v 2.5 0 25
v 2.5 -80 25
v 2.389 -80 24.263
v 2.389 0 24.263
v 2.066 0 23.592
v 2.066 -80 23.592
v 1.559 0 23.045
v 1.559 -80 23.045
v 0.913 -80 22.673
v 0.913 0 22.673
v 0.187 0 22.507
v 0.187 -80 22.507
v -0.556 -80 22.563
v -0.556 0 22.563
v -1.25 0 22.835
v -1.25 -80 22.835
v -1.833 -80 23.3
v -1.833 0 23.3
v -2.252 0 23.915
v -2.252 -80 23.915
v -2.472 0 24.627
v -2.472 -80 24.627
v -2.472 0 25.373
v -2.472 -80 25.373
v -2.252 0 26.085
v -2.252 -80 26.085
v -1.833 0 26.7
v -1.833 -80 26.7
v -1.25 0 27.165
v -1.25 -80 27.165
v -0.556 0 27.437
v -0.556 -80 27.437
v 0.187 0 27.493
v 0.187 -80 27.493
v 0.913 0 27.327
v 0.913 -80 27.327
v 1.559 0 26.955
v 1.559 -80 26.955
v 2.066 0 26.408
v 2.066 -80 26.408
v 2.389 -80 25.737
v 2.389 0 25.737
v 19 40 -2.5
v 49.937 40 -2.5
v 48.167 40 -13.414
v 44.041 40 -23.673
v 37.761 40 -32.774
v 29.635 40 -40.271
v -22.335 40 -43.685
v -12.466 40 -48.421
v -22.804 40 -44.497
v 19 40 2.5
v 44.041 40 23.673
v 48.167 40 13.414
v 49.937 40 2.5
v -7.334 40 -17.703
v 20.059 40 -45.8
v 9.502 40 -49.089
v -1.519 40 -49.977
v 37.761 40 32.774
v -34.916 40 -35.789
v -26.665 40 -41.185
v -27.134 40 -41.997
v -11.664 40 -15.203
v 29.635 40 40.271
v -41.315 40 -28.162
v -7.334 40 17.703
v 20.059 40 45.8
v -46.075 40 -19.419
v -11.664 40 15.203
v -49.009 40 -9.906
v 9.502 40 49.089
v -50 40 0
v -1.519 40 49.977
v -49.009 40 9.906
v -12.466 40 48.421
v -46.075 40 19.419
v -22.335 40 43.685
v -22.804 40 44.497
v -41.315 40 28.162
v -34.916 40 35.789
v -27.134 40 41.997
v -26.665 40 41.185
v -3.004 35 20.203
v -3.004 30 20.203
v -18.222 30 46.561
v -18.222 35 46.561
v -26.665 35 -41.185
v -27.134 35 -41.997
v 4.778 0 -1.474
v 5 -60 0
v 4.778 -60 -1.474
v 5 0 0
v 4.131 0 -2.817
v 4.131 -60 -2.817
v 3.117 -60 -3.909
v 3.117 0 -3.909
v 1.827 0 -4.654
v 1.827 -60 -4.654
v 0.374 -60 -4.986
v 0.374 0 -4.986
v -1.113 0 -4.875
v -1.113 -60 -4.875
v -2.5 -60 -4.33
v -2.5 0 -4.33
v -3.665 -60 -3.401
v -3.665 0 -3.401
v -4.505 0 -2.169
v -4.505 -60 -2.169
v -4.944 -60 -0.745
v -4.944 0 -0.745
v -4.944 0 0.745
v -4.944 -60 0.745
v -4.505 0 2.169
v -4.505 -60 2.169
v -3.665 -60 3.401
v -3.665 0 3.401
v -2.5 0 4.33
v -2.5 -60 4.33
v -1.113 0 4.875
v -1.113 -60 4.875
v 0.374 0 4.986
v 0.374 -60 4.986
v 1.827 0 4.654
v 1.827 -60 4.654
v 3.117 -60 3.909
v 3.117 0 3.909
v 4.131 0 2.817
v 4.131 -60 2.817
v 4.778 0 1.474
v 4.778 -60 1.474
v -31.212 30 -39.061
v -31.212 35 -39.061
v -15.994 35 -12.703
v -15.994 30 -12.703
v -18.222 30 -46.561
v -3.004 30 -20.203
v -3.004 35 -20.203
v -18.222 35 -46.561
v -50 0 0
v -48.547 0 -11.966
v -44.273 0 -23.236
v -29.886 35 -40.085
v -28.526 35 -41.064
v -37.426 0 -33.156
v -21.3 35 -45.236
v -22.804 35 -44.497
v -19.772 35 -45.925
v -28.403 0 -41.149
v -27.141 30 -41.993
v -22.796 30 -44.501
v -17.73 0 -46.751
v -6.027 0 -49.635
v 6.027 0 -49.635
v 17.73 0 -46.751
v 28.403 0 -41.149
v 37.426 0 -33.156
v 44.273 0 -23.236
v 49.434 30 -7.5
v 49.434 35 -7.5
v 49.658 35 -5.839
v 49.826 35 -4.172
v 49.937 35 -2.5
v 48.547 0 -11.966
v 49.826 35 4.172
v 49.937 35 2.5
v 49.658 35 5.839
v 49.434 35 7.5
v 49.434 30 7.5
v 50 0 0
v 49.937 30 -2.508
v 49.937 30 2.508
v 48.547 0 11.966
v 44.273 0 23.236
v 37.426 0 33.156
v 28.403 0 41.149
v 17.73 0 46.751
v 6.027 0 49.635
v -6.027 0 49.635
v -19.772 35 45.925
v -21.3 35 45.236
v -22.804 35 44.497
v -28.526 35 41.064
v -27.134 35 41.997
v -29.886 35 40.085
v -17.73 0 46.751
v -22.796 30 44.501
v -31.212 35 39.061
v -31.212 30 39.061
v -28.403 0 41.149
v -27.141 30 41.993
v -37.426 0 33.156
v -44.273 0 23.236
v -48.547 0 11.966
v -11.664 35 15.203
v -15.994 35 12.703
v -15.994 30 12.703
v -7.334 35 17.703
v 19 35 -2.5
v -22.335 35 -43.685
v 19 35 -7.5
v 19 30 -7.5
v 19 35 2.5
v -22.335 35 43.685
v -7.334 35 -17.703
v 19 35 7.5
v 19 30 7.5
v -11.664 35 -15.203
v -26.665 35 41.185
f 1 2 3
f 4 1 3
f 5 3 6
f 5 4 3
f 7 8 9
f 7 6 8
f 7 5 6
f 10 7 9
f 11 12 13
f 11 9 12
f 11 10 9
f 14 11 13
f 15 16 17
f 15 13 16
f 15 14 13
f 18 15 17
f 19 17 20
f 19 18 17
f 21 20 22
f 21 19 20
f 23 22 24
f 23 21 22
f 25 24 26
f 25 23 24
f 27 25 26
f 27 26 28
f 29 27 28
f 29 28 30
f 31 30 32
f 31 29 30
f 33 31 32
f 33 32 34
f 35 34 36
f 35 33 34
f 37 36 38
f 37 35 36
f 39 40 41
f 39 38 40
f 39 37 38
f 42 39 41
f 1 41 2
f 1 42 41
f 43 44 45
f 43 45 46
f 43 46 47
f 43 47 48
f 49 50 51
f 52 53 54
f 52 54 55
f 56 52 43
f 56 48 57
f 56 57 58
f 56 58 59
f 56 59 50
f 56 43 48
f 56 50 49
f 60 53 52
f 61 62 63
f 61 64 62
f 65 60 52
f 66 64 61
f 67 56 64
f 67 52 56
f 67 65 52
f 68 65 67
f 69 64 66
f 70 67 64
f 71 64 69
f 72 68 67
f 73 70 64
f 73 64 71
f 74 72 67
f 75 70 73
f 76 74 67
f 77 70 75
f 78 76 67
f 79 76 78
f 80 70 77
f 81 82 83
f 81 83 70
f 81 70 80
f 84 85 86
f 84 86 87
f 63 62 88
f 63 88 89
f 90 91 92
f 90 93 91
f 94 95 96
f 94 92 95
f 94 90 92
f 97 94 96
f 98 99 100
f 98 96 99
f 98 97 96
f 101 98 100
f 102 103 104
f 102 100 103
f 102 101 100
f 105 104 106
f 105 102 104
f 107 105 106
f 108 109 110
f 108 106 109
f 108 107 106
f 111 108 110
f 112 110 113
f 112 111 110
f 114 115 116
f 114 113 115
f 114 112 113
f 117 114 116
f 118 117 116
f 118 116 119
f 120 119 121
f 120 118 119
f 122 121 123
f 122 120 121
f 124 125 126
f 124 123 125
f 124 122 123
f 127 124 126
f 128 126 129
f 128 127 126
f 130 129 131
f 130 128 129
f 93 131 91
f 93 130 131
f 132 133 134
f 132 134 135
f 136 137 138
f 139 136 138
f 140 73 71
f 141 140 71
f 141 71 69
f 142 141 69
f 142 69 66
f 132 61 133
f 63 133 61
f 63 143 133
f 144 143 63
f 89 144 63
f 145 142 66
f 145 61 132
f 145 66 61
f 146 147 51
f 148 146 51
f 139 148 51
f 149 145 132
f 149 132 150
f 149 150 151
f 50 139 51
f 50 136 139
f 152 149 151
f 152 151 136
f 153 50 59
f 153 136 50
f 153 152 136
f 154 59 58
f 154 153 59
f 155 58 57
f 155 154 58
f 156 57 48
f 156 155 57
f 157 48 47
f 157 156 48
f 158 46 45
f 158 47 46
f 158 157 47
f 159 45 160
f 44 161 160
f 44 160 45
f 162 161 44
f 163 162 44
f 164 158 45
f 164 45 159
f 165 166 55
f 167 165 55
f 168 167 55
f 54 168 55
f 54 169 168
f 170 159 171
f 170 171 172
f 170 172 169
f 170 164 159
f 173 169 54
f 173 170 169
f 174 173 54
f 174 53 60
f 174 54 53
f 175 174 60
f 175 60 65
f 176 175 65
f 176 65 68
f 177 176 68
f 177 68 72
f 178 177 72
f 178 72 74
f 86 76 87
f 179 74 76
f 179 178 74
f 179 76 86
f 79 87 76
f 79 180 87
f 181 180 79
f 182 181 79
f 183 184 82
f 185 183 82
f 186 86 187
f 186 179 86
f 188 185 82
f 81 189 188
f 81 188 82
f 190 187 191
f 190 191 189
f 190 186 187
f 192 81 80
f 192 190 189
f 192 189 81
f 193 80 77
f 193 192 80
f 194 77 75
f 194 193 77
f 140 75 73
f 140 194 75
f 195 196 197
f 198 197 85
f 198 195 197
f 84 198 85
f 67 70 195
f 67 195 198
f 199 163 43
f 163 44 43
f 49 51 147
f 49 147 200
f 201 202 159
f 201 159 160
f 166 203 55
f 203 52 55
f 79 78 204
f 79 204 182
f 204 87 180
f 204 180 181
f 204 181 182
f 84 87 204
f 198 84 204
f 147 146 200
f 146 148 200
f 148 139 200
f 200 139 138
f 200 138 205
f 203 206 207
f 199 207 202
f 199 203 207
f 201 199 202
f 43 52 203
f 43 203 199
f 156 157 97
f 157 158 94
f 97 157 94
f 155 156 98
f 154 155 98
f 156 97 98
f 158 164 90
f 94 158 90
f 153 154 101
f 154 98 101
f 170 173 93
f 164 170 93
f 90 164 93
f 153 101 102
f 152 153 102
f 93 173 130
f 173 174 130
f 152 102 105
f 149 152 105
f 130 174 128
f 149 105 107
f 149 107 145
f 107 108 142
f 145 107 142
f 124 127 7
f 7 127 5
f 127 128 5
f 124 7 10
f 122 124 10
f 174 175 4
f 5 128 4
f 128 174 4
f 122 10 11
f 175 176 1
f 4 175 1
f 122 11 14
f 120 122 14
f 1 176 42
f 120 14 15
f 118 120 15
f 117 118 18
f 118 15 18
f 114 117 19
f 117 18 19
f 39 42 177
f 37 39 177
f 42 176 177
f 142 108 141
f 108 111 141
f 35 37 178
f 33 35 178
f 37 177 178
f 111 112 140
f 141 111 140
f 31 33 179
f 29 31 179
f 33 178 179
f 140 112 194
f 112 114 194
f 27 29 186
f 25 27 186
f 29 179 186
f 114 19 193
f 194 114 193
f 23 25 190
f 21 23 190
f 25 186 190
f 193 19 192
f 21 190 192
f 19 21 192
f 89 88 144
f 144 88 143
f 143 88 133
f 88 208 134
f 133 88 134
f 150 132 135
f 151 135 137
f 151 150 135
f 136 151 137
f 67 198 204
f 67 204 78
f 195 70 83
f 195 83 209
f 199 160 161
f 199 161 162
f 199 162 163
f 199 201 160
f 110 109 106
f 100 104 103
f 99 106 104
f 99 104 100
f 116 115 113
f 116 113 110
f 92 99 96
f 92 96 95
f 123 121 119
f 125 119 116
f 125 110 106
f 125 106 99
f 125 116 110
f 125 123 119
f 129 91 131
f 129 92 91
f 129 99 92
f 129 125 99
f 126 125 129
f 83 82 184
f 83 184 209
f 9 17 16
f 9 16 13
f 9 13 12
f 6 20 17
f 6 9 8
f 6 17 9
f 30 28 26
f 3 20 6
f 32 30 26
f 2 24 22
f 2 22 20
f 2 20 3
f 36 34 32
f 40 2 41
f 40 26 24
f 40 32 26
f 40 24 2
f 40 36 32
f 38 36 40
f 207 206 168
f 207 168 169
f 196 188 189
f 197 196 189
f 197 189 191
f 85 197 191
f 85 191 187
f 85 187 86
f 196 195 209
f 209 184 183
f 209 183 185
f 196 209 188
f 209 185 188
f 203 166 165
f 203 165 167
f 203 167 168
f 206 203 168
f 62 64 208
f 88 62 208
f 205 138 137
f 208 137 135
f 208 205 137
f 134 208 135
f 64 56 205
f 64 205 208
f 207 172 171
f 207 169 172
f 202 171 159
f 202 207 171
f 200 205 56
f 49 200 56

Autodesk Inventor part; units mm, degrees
ref_plane "YZ Plane" through (0, 0, 0) normal (1, 0, 0) x (0, 1, 0)
ref_plane "XZ Plane" through (0, 0, 0) normal (0, 1, 0) x (-1, 0, 0)
ref_plane "XY Plane" through (0, 0, 0) normal (0, 0, 1) x (1, 0, 0)
sketch "Sketch1" plane through (0, 0, 0) normal (0, 1, 0) x (-1, 0, 0)
  circle A0 centre (0, 0) radius 50
  dimension "d0" = 100
extrude "Extrusion1" add sketch "Sketch1" along normal blind 40
sketch "Sketch6" plane through (0, 0, 0) normal (0, -1, 0) x (1, 0, 0)
  circle A0 centre (0, 0) radius 5
  dimension "d36" = 10
extrude "Extrusion6" add sketch "Sketch6" along normal blind 60
thread "Thread1" size "M10x1.5" class "6g" standard "ANSI Metric M Profile" full length
sketch "Sketch7" plane through (0, 40, 0) normal (0, 1, 0) x (1, 0, 0)
  line L0 (0, 0) -> (0, 50)
  circle A0 centre (0, 0) radius 5 projected
  line L1 (-27.5, -47.6314) -> (-29.6651, -46.3814)
  line L2 (-29.6651, -46.3814) -> (-26.6651, -41.1852)
  line L3 (-22.3349, -43.6852) -> (-25.3349, -48.8814)
  line L4 (-25.3349, -48.8814) -> (-27.5, -47.6314)
  line L5 (-22.3349, -43.6852) -> (-26.6651, -41.1852)
  line L6 (-27.5, 47.6314) -> (-25.3349, 48.8814)
  line L7 (-25.3349, 48.8814) -> (-22.3349, 43.6852)
  line L8 (-22.3349, 43.6852) -> (-26.6651, 41.1852)
  line L9 (-26.6651, 41.1852) -> (-29.6651, 46.3814)
  line L10 (-29.6651, 46.3814) -> (-27.5, 47.6314)
  line L11 (55, 0) -> (55, 2.5)
  line L12 (55, 2.5) -> (49, 2.5)
  line L13 (49, 2.5) -> (49, -2.5)
  line L14 (49, -2.5) -> (55, -2.5)
  line L15 (55, -2.5) -> (55, 0)
  dimension "d52" = 5
  dimension "d55" = 6
  dimension "d58" = 2.5
  dimension "d60" = 5
extrude "Extrusion7" cut sketch "Sketch7" against normal blind 5 contours L1 L2 L5 L3 L4 | L6 L7 L8 L9 L10 | L15 L14 L13 L12 L11
sketch "Sketch8" plane through (-22.3349, 35, -43.6852) normal (-0.5, 0, -0.866) x (-0.866, 0, 0.5)
  line L0 (0, 5) -> (5, 5)
  line L1 (5, 5) -> (5, 0)
  line L2 (5, 5) -> (5, 0) projected
  line L3 (5, 0) -> (10, 0)
  line L4 (10, 0) -> (10, -5)
  line L5 (10, -5) -> (-5, -5)
  line L6 (-5, -5) -> (-5, 0)
  line L7 (-5, 0) -> (0, 0)
  line L8 (0, 0) -> (0, 5)
  line L9 (0, 5) -> (0, 0) projected
  point P0 (2.5, -35)
  dimension "d63" = 5
  dimension "d64" = 5
  dimension "d65" = 15
extrude "Extrusion8" cut sketch "Sketch8" along normal mid plane 60
sketch "Sketch9" plane through (49, 40, 2.5) normal (1, 0, 0) x (0, 0, -1)
  line L0 (5, 0) -> (0, 0)
  line L1 (0, 0) -> (5, 0) projected
  line L2 (0, 0) -> (0, -5)
  line L3 (0, -5) -> (0, 0) projected
  line L4 (0, -5) -> (-5, -5)
  line L5 (-5, -5) -> (-5, -10)
  line L6 (-5, -10) -> (10, -10)
  line L7 (10, -10) -> (10, -5)
  line L8 (10, -5) -> (5, -5)
  line L9 (5, -5) -> (5, 0)
  line L10 (5, 0) -> (5, -5) projected
  point P0 (2.5, -40)
  dimension "d68" = 5
  dimension "d69" = 5
  dimension "d70" = 15
extrude "Extrusion9" cut sketch "Sketch9" along normal mid plane 60
sketch "Sketch10" plane through (-26.6651, 35, 41.1852) normal (-0.5, 0, 0.866) x (0.866, 0, 0.5)
  line L0 (5, 5) -> (0, 5)
  line L1 (0, 5) -> (5, 5) projected
  line L2 (0, 5) -> (0, 0)
  line L3 (0, 0) -> (0, 5) projected
  line L4 (0, 0) -> (-5, 0)
  line L5 (-10.2045, 0) -> (-36.5614, 0) projected
  line L6 (-5, 0) -> (-5, -5)
  line L7 (-5, -5) -> (10, -5)
  line L8 (10, -5) -> (10, 0)
  line L9 (10, 0) -> (5, 0)
  line L10 (5, 0) -> (5, 5)
  point P0 (2.5, -35)
  dimension "d73" = 5
  dimension "d74" = 5
  dimension "d75" = 15
extrude "Extrusion10" cut sketch "Sketch10" along normal mid plane 60
sketch "Sketch11" plane through (0, 0, 0) normal (0, -1, 0) x (1, 0, 0)
  circle A0 centre (0, 25) radius 2.5
  point P0 (0, 0)
  dimension "d82" = 5
extrude "Extrusion11" add sketch "Sketch11" along normal blind 80
